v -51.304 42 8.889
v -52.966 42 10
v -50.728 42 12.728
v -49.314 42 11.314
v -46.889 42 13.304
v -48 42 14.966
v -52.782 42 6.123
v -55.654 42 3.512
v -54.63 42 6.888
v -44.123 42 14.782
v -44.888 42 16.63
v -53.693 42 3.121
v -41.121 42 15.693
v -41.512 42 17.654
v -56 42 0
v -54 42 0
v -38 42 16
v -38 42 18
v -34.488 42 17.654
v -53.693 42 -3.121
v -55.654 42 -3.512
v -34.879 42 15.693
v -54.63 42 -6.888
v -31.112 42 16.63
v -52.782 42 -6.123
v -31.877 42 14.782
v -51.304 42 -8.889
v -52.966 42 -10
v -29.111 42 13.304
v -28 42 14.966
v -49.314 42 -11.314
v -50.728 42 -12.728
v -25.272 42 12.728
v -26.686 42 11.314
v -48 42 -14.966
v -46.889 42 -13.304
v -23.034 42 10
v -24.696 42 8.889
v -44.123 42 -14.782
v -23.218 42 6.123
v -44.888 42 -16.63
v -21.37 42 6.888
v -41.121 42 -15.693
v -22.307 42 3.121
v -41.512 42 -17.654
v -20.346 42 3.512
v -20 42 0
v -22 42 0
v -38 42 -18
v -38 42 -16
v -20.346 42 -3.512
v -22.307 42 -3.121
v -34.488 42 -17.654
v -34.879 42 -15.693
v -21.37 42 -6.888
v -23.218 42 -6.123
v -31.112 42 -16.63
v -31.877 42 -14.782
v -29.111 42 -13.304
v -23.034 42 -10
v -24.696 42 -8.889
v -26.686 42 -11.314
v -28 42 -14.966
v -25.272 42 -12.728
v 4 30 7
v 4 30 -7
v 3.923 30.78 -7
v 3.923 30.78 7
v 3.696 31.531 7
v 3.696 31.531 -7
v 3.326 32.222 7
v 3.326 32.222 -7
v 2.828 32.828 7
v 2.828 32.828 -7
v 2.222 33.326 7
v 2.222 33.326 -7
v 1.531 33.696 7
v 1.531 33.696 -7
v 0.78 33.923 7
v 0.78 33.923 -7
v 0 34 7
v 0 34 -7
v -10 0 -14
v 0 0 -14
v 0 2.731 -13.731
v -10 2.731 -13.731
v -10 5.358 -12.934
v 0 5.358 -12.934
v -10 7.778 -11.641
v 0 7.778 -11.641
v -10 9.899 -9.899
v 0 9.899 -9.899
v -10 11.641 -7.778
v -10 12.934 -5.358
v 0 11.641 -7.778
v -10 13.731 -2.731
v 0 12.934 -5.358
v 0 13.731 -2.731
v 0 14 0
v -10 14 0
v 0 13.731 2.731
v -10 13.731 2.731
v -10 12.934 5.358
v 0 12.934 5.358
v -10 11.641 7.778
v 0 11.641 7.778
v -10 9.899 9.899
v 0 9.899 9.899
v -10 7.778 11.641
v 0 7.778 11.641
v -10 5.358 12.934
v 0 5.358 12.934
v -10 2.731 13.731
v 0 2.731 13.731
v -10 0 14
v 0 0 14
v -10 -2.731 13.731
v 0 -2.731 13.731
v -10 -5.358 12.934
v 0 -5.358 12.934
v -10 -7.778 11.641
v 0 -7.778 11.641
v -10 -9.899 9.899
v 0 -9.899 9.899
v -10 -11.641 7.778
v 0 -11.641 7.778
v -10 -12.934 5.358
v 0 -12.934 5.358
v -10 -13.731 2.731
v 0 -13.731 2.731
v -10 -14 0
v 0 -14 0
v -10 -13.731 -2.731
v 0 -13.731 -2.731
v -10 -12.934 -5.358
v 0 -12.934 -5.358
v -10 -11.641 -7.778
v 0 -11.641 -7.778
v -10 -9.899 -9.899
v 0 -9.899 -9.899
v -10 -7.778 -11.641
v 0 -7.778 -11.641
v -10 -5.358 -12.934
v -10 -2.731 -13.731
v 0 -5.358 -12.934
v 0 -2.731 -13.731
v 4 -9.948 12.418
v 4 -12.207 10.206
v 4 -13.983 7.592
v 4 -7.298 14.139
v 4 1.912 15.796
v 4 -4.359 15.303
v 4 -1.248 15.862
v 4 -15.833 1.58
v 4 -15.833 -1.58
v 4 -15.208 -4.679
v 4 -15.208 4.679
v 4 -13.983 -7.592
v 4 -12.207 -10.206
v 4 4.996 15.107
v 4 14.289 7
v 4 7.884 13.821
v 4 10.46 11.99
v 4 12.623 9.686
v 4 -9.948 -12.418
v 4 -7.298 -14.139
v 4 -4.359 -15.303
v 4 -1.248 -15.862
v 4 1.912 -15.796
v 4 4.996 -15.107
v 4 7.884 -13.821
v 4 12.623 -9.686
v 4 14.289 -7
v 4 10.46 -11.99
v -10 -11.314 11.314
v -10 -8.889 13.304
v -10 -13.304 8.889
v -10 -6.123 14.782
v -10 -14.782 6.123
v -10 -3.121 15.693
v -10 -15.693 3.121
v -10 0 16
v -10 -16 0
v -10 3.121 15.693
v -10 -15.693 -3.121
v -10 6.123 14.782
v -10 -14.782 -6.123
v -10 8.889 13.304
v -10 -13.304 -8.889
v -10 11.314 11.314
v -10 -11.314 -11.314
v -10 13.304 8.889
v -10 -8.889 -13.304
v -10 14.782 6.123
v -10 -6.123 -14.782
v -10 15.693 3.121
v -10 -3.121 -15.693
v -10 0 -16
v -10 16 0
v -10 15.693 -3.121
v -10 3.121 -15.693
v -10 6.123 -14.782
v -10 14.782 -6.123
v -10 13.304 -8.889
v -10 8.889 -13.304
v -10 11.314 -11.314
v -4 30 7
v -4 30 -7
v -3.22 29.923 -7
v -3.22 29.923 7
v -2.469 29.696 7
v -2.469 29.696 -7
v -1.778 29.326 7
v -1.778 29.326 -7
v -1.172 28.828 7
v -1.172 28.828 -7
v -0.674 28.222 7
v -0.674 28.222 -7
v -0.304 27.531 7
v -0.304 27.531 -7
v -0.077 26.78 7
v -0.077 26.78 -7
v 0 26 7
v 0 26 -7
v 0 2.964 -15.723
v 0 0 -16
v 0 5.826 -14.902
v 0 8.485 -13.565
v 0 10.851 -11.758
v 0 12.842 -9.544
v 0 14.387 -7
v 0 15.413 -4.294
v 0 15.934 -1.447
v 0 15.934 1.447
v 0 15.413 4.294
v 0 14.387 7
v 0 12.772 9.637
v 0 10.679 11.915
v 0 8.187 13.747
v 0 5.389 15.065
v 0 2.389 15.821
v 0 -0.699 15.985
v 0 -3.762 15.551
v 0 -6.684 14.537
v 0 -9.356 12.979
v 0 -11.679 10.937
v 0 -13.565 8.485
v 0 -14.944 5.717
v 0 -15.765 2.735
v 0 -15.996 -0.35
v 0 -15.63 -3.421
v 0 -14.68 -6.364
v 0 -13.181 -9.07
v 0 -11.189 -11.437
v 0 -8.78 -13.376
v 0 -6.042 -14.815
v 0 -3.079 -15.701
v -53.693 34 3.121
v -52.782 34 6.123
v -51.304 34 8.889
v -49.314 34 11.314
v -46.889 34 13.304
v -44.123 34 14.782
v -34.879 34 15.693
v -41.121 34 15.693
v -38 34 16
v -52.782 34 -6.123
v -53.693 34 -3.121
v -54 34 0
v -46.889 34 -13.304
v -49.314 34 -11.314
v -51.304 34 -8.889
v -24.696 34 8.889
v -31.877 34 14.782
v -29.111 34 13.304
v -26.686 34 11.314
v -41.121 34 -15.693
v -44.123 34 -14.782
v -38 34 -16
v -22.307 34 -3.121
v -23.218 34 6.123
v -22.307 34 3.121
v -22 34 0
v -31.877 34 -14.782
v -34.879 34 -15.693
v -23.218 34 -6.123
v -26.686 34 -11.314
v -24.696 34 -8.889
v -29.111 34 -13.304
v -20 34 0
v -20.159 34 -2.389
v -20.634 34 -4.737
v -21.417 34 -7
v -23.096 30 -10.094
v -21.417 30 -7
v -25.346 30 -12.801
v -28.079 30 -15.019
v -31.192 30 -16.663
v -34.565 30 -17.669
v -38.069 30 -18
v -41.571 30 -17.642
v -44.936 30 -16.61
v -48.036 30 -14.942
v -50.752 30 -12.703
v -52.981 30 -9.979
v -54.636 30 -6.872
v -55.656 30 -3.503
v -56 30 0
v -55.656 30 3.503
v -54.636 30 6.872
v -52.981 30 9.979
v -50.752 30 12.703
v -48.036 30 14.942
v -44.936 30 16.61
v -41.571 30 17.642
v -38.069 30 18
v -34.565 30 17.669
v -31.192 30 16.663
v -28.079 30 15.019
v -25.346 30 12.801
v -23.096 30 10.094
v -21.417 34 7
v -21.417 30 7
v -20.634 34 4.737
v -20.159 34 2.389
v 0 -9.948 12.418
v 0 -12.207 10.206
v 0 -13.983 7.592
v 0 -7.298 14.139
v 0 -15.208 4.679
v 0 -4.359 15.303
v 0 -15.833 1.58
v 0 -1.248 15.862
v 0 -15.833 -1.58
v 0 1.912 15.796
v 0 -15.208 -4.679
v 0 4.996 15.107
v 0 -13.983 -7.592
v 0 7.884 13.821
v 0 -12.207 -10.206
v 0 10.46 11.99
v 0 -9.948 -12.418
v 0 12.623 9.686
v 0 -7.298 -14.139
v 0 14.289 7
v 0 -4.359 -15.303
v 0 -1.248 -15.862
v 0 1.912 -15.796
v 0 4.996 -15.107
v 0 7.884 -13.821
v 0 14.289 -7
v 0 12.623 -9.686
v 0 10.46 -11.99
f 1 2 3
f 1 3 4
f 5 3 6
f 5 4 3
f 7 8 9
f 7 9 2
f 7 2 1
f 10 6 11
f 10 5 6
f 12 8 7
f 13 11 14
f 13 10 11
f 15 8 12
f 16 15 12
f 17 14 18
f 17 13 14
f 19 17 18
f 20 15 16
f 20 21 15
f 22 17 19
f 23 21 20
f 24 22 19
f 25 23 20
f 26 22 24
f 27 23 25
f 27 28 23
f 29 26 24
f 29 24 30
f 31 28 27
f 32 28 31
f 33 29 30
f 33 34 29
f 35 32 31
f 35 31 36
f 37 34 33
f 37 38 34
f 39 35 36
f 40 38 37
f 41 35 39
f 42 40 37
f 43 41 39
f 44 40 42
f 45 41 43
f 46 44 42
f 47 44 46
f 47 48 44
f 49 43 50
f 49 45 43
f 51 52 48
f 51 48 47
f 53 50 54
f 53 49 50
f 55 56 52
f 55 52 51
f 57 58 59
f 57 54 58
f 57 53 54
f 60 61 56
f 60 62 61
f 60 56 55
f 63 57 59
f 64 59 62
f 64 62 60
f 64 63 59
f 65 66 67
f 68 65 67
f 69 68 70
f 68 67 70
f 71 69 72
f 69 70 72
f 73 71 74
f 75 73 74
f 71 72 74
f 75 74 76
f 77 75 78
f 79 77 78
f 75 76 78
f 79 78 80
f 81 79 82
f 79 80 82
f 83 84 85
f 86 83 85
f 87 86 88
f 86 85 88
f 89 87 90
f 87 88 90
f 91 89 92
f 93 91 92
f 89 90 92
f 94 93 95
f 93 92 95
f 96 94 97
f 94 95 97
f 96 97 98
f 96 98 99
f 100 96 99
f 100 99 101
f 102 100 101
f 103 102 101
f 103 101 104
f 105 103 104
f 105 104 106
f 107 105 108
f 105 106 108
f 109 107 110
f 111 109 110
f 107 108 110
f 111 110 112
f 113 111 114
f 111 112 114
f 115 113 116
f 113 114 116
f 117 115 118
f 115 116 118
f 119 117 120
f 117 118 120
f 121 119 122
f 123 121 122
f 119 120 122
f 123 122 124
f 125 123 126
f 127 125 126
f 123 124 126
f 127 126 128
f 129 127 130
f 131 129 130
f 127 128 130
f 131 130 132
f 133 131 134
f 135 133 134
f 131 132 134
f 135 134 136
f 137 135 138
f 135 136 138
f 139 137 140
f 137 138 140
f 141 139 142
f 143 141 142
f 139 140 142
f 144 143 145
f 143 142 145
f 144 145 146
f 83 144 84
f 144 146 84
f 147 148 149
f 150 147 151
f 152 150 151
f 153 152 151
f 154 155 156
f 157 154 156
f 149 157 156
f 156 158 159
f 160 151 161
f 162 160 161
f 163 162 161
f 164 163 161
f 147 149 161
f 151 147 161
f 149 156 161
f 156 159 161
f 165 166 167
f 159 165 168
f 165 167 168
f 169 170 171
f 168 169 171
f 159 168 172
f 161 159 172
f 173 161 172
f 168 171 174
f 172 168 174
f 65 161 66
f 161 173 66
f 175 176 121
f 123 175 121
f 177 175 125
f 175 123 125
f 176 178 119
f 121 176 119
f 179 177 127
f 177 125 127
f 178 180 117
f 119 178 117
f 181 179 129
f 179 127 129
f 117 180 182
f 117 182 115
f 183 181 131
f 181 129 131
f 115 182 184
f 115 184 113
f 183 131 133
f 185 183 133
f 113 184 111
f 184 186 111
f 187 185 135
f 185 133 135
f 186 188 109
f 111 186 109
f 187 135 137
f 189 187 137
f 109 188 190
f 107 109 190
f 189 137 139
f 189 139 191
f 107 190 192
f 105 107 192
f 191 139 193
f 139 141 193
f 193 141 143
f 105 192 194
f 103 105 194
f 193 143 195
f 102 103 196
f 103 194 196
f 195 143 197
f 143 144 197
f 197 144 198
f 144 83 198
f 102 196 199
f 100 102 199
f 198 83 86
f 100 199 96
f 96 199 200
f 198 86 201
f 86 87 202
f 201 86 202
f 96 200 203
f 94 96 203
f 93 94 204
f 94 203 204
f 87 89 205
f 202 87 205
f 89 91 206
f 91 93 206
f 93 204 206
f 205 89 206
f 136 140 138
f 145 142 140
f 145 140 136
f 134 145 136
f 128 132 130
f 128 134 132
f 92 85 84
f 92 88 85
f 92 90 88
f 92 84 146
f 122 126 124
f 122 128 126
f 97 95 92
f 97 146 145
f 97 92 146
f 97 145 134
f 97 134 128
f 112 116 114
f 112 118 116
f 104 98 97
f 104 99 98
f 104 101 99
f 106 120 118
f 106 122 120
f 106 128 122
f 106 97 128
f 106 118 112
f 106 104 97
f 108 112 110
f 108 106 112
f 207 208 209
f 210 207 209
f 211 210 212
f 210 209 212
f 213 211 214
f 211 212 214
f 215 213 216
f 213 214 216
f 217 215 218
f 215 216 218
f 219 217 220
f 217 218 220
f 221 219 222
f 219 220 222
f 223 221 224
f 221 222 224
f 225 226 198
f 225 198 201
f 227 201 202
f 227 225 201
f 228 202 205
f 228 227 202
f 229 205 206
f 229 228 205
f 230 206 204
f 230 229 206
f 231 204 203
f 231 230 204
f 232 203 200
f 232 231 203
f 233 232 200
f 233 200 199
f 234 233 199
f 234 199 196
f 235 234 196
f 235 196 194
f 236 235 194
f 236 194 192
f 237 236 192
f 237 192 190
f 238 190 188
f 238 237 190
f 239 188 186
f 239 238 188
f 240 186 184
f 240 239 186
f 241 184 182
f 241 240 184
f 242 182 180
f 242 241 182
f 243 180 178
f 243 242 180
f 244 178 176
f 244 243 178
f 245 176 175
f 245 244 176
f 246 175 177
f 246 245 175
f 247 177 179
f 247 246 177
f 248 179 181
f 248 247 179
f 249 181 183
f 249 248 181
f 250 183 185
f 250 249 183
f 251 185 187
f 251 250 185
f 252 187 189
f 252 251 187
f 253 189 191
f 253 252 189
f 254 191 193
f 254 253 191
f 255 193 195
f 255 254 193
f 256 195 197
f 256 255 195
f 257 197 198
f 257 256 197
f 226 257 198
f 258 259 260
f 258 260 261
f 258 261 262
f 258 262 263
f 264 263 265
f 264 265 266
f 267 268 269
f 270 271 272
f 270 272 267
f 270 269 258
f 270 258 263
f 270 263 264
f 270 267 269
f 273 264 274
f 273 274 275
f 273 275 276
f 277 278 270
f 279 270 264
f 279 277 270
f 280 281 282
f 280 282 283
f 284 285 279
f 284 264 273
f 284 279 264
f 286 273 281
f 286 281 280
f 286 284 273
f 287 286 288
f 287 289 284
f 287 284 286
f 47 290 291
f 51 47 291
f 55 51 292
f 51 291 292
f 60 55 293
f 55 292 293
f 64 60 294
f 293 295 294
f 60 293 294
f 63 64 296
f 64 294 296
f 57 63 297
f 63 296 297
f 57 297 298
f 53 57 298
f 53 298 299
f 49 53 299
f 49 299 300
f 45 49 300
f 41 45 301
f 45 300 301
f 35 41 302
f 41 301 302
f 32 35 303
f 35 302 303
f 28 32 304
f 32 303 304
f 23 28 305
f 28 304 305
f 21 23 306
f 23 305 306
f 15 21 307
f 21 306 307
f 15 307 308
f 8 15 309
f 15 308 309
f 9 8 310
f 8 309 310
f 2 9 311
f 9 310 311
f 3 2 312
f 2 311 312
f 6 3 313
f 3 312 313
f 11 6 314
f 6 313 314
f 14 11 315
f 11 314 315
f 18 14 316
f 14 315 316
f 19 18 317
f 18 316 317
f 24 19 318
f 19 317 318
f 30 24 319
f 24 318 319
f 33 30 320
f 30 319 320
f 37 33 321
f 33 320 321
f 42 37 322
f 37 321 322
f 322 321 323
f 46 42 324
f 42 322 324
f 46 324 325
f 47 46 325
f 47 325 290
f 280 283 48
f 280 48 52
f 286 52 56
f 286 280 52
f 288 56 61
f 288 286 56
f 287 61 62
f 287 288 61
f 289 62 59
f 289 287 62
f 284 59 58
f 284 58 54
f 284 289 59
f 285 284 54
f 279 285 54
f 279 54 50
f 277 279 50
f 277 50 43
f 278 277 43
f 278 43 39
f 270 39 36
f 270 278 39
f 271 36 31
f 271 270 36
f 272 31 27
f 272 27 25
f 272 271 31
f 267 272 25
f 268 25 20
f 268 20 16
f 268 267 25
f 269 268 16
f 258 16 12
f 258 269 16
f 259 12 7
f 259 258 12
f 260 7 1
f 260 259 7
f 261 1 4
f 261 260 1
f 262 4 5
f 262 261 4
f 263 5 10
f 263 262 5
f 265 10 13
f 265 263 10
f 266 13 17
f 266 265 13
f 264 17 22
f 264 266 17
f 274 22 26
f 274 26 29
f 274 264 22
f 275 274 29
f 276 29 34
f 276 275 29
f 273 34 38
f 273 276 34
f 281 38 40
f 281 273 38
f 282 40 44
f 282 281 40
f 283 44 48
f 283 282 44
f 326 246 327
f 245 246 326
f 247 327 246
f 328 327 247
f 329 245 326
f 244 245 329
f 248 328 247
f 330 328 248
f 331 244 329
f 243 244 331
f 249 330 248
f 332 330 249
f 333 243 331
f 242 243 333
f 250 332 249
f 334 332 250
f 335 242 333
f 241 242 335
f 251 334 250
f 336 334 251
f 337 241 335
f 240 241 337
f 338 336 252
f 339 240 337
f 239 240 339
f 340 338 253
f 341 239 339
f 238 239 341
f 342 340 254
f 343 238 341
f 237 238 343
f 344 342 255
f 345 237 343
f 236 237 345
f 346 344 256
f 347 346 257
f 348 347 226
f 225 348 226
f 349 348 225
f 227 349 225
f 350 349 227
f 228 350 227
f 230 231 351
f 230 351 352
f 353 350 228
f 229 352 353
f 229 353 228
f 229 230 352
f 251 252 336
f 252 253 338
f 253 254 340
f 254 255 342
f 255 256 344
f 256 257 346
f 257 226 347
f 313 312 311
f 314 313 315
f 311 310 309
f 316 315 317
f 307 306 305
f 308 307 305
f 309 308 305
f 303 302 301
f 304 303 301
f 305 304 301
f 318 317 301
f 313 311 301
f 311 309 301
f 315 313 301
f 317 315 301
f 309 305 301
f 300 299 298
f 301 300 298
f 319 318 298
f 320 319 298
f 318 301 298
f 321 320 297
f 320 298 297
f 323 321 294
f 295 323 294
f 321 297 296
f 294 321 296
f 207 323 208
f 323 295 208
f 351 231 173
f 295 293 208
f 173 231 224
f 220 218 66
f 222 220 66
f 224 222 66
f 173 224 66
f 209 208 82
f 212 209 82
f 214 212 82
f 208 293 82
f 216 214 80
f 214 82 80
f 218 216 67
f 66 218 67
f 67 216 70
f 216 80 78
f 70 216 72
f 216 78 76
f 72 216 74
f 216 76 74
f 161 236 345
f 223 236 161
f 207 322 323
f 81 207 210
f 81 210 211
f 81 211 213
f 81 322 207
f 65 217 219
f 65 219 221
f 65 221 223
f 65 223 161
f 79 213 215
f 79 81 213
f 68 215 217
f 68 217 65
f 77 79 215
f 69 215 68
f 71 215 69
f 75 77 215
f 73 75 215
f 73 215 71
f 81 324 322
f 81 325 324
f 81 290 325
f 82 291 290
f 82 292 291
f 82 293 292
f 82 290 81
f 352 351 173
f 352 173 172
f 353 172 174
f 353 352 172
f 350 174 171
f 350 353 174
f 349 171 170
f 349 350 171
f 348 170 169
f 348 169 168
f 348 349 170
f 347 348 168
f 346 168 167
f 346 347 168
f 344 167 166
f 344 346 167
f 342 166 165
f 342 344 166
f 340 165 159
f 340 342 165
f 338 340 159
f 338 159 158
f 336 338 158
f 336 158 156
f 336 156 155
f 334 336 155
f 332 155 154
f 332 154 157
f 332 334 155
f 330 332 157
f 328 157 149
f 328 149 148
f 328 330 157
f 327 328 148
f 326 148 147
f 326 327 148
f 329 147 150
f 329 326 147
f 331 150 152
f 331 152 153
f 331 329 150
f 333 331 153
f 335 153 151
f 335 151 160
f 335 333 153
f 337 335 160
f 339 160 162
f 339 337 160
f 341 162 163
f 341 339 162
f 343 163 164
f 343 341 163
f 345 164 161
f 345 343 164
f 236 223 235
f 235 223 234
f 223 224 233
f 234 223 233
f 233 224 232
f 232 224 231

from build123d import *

# Parameters (mm, degrees)
SKETCH1_R           = 16
SKETCH1_R_2         = 14
BOSS_EXTRUDE1_DEPTH = 10
BOSS_EXTRUDE2_DEPTH = 4
BOSS_EXTRUDE3_DEPTH = 14
SKETCH4_R           = 18
BOSS_EXTRUDE4_DEPTH = 4
SKETCH5_R           = 18
SKETCH5_R_2         = 16
BOSS_EXTRUDE5_DEPTH = 8


with BuildPart() as part:
    # Sketch1 → Boss-Extrude1 (new body)
    with BuildSketch(Plane(origin=(0, 0, 0), x_dir=(0, 0, -1), z_dir=(1, 0, 0))):
        Circle(SKETCH1_R)
        Circle(SKETCH1_R_2, mode=Mode.SUBTRACT)
    extrude(amount=-BOSS_EXTRUDE1_DEPTH)

    # Sketch2 → Boss-Extrude2 (add)
    with BuildSketch(Plane(origin=(0, 0, 0), x_dir=(0, 0, -1), z_dir=(1, 0, 0))):
        with BuildLine():
            Line((-7, 14.288943502), (-7, 20))
            Line((-7, 20), (7, 20))
            Line((7, 20), (7, 14.288943502))
            ThreePointArc((7, 14.288943502), (0, -15.911439483), (-7, 14.288943502))
        make_face()
    extrude(amount=BOSS_EXTRUDE2_DEPTH)

    # Sketch3 → Boss-Extrude3 (add)
    with BuildSketch(Plane(origin=(0, 0, -7), x_dir=(-1, 0, 0), z_dir=(0, 0, -1))):
        with BuildLine():
            Line((0, 20), (-4, 20))
            Line((-4, 20), (-4, 30))
            ThreePointArc((-4, 30), (-2.828427125, 32.828427125), (0, 34))
            Line((0, 34), (38, 34))
            Line((38, 34), (38, 30))
            Line((38, 30), (4, 30))
            ThreePointArc((4, 30), (1.171572875, 28.828427125), (0, 26))
            Line((0, 26), (0, 20))
        make_face()
    extrude(amount=-BOSS_EXTRUDE3_DEPTH)

    # Sketch4 → Boss-Extrude4 (add)
    with BuildSketch(Plane(origin=(0, 34, 0), x_dir=(1, 0, 0), z_dir=(0, 1, 0))):
        with Locations((-38, 0)):
            Circle(SKETCH4_R)
    extrude(amount=-BOSS_EXTRUDE4_DEPTH)

    # Sketch5 → Boss-Extrude5 (add)
    with BuildSketch(Plane(origin=(0, 34, 0), x_dir=(1, 0, 0), z_dir=(0, 1, 0))):
        with Locations((-38, 0)):
            Circle(SKETCH5_R)
        with Locations((-38, 0)):
            Circle(SKETCH5_R_2, mode=Mode.SUBTRACT)
    extrude(amount=BOSS_EXTRUDE5_DEPTH)


solid = part.part
